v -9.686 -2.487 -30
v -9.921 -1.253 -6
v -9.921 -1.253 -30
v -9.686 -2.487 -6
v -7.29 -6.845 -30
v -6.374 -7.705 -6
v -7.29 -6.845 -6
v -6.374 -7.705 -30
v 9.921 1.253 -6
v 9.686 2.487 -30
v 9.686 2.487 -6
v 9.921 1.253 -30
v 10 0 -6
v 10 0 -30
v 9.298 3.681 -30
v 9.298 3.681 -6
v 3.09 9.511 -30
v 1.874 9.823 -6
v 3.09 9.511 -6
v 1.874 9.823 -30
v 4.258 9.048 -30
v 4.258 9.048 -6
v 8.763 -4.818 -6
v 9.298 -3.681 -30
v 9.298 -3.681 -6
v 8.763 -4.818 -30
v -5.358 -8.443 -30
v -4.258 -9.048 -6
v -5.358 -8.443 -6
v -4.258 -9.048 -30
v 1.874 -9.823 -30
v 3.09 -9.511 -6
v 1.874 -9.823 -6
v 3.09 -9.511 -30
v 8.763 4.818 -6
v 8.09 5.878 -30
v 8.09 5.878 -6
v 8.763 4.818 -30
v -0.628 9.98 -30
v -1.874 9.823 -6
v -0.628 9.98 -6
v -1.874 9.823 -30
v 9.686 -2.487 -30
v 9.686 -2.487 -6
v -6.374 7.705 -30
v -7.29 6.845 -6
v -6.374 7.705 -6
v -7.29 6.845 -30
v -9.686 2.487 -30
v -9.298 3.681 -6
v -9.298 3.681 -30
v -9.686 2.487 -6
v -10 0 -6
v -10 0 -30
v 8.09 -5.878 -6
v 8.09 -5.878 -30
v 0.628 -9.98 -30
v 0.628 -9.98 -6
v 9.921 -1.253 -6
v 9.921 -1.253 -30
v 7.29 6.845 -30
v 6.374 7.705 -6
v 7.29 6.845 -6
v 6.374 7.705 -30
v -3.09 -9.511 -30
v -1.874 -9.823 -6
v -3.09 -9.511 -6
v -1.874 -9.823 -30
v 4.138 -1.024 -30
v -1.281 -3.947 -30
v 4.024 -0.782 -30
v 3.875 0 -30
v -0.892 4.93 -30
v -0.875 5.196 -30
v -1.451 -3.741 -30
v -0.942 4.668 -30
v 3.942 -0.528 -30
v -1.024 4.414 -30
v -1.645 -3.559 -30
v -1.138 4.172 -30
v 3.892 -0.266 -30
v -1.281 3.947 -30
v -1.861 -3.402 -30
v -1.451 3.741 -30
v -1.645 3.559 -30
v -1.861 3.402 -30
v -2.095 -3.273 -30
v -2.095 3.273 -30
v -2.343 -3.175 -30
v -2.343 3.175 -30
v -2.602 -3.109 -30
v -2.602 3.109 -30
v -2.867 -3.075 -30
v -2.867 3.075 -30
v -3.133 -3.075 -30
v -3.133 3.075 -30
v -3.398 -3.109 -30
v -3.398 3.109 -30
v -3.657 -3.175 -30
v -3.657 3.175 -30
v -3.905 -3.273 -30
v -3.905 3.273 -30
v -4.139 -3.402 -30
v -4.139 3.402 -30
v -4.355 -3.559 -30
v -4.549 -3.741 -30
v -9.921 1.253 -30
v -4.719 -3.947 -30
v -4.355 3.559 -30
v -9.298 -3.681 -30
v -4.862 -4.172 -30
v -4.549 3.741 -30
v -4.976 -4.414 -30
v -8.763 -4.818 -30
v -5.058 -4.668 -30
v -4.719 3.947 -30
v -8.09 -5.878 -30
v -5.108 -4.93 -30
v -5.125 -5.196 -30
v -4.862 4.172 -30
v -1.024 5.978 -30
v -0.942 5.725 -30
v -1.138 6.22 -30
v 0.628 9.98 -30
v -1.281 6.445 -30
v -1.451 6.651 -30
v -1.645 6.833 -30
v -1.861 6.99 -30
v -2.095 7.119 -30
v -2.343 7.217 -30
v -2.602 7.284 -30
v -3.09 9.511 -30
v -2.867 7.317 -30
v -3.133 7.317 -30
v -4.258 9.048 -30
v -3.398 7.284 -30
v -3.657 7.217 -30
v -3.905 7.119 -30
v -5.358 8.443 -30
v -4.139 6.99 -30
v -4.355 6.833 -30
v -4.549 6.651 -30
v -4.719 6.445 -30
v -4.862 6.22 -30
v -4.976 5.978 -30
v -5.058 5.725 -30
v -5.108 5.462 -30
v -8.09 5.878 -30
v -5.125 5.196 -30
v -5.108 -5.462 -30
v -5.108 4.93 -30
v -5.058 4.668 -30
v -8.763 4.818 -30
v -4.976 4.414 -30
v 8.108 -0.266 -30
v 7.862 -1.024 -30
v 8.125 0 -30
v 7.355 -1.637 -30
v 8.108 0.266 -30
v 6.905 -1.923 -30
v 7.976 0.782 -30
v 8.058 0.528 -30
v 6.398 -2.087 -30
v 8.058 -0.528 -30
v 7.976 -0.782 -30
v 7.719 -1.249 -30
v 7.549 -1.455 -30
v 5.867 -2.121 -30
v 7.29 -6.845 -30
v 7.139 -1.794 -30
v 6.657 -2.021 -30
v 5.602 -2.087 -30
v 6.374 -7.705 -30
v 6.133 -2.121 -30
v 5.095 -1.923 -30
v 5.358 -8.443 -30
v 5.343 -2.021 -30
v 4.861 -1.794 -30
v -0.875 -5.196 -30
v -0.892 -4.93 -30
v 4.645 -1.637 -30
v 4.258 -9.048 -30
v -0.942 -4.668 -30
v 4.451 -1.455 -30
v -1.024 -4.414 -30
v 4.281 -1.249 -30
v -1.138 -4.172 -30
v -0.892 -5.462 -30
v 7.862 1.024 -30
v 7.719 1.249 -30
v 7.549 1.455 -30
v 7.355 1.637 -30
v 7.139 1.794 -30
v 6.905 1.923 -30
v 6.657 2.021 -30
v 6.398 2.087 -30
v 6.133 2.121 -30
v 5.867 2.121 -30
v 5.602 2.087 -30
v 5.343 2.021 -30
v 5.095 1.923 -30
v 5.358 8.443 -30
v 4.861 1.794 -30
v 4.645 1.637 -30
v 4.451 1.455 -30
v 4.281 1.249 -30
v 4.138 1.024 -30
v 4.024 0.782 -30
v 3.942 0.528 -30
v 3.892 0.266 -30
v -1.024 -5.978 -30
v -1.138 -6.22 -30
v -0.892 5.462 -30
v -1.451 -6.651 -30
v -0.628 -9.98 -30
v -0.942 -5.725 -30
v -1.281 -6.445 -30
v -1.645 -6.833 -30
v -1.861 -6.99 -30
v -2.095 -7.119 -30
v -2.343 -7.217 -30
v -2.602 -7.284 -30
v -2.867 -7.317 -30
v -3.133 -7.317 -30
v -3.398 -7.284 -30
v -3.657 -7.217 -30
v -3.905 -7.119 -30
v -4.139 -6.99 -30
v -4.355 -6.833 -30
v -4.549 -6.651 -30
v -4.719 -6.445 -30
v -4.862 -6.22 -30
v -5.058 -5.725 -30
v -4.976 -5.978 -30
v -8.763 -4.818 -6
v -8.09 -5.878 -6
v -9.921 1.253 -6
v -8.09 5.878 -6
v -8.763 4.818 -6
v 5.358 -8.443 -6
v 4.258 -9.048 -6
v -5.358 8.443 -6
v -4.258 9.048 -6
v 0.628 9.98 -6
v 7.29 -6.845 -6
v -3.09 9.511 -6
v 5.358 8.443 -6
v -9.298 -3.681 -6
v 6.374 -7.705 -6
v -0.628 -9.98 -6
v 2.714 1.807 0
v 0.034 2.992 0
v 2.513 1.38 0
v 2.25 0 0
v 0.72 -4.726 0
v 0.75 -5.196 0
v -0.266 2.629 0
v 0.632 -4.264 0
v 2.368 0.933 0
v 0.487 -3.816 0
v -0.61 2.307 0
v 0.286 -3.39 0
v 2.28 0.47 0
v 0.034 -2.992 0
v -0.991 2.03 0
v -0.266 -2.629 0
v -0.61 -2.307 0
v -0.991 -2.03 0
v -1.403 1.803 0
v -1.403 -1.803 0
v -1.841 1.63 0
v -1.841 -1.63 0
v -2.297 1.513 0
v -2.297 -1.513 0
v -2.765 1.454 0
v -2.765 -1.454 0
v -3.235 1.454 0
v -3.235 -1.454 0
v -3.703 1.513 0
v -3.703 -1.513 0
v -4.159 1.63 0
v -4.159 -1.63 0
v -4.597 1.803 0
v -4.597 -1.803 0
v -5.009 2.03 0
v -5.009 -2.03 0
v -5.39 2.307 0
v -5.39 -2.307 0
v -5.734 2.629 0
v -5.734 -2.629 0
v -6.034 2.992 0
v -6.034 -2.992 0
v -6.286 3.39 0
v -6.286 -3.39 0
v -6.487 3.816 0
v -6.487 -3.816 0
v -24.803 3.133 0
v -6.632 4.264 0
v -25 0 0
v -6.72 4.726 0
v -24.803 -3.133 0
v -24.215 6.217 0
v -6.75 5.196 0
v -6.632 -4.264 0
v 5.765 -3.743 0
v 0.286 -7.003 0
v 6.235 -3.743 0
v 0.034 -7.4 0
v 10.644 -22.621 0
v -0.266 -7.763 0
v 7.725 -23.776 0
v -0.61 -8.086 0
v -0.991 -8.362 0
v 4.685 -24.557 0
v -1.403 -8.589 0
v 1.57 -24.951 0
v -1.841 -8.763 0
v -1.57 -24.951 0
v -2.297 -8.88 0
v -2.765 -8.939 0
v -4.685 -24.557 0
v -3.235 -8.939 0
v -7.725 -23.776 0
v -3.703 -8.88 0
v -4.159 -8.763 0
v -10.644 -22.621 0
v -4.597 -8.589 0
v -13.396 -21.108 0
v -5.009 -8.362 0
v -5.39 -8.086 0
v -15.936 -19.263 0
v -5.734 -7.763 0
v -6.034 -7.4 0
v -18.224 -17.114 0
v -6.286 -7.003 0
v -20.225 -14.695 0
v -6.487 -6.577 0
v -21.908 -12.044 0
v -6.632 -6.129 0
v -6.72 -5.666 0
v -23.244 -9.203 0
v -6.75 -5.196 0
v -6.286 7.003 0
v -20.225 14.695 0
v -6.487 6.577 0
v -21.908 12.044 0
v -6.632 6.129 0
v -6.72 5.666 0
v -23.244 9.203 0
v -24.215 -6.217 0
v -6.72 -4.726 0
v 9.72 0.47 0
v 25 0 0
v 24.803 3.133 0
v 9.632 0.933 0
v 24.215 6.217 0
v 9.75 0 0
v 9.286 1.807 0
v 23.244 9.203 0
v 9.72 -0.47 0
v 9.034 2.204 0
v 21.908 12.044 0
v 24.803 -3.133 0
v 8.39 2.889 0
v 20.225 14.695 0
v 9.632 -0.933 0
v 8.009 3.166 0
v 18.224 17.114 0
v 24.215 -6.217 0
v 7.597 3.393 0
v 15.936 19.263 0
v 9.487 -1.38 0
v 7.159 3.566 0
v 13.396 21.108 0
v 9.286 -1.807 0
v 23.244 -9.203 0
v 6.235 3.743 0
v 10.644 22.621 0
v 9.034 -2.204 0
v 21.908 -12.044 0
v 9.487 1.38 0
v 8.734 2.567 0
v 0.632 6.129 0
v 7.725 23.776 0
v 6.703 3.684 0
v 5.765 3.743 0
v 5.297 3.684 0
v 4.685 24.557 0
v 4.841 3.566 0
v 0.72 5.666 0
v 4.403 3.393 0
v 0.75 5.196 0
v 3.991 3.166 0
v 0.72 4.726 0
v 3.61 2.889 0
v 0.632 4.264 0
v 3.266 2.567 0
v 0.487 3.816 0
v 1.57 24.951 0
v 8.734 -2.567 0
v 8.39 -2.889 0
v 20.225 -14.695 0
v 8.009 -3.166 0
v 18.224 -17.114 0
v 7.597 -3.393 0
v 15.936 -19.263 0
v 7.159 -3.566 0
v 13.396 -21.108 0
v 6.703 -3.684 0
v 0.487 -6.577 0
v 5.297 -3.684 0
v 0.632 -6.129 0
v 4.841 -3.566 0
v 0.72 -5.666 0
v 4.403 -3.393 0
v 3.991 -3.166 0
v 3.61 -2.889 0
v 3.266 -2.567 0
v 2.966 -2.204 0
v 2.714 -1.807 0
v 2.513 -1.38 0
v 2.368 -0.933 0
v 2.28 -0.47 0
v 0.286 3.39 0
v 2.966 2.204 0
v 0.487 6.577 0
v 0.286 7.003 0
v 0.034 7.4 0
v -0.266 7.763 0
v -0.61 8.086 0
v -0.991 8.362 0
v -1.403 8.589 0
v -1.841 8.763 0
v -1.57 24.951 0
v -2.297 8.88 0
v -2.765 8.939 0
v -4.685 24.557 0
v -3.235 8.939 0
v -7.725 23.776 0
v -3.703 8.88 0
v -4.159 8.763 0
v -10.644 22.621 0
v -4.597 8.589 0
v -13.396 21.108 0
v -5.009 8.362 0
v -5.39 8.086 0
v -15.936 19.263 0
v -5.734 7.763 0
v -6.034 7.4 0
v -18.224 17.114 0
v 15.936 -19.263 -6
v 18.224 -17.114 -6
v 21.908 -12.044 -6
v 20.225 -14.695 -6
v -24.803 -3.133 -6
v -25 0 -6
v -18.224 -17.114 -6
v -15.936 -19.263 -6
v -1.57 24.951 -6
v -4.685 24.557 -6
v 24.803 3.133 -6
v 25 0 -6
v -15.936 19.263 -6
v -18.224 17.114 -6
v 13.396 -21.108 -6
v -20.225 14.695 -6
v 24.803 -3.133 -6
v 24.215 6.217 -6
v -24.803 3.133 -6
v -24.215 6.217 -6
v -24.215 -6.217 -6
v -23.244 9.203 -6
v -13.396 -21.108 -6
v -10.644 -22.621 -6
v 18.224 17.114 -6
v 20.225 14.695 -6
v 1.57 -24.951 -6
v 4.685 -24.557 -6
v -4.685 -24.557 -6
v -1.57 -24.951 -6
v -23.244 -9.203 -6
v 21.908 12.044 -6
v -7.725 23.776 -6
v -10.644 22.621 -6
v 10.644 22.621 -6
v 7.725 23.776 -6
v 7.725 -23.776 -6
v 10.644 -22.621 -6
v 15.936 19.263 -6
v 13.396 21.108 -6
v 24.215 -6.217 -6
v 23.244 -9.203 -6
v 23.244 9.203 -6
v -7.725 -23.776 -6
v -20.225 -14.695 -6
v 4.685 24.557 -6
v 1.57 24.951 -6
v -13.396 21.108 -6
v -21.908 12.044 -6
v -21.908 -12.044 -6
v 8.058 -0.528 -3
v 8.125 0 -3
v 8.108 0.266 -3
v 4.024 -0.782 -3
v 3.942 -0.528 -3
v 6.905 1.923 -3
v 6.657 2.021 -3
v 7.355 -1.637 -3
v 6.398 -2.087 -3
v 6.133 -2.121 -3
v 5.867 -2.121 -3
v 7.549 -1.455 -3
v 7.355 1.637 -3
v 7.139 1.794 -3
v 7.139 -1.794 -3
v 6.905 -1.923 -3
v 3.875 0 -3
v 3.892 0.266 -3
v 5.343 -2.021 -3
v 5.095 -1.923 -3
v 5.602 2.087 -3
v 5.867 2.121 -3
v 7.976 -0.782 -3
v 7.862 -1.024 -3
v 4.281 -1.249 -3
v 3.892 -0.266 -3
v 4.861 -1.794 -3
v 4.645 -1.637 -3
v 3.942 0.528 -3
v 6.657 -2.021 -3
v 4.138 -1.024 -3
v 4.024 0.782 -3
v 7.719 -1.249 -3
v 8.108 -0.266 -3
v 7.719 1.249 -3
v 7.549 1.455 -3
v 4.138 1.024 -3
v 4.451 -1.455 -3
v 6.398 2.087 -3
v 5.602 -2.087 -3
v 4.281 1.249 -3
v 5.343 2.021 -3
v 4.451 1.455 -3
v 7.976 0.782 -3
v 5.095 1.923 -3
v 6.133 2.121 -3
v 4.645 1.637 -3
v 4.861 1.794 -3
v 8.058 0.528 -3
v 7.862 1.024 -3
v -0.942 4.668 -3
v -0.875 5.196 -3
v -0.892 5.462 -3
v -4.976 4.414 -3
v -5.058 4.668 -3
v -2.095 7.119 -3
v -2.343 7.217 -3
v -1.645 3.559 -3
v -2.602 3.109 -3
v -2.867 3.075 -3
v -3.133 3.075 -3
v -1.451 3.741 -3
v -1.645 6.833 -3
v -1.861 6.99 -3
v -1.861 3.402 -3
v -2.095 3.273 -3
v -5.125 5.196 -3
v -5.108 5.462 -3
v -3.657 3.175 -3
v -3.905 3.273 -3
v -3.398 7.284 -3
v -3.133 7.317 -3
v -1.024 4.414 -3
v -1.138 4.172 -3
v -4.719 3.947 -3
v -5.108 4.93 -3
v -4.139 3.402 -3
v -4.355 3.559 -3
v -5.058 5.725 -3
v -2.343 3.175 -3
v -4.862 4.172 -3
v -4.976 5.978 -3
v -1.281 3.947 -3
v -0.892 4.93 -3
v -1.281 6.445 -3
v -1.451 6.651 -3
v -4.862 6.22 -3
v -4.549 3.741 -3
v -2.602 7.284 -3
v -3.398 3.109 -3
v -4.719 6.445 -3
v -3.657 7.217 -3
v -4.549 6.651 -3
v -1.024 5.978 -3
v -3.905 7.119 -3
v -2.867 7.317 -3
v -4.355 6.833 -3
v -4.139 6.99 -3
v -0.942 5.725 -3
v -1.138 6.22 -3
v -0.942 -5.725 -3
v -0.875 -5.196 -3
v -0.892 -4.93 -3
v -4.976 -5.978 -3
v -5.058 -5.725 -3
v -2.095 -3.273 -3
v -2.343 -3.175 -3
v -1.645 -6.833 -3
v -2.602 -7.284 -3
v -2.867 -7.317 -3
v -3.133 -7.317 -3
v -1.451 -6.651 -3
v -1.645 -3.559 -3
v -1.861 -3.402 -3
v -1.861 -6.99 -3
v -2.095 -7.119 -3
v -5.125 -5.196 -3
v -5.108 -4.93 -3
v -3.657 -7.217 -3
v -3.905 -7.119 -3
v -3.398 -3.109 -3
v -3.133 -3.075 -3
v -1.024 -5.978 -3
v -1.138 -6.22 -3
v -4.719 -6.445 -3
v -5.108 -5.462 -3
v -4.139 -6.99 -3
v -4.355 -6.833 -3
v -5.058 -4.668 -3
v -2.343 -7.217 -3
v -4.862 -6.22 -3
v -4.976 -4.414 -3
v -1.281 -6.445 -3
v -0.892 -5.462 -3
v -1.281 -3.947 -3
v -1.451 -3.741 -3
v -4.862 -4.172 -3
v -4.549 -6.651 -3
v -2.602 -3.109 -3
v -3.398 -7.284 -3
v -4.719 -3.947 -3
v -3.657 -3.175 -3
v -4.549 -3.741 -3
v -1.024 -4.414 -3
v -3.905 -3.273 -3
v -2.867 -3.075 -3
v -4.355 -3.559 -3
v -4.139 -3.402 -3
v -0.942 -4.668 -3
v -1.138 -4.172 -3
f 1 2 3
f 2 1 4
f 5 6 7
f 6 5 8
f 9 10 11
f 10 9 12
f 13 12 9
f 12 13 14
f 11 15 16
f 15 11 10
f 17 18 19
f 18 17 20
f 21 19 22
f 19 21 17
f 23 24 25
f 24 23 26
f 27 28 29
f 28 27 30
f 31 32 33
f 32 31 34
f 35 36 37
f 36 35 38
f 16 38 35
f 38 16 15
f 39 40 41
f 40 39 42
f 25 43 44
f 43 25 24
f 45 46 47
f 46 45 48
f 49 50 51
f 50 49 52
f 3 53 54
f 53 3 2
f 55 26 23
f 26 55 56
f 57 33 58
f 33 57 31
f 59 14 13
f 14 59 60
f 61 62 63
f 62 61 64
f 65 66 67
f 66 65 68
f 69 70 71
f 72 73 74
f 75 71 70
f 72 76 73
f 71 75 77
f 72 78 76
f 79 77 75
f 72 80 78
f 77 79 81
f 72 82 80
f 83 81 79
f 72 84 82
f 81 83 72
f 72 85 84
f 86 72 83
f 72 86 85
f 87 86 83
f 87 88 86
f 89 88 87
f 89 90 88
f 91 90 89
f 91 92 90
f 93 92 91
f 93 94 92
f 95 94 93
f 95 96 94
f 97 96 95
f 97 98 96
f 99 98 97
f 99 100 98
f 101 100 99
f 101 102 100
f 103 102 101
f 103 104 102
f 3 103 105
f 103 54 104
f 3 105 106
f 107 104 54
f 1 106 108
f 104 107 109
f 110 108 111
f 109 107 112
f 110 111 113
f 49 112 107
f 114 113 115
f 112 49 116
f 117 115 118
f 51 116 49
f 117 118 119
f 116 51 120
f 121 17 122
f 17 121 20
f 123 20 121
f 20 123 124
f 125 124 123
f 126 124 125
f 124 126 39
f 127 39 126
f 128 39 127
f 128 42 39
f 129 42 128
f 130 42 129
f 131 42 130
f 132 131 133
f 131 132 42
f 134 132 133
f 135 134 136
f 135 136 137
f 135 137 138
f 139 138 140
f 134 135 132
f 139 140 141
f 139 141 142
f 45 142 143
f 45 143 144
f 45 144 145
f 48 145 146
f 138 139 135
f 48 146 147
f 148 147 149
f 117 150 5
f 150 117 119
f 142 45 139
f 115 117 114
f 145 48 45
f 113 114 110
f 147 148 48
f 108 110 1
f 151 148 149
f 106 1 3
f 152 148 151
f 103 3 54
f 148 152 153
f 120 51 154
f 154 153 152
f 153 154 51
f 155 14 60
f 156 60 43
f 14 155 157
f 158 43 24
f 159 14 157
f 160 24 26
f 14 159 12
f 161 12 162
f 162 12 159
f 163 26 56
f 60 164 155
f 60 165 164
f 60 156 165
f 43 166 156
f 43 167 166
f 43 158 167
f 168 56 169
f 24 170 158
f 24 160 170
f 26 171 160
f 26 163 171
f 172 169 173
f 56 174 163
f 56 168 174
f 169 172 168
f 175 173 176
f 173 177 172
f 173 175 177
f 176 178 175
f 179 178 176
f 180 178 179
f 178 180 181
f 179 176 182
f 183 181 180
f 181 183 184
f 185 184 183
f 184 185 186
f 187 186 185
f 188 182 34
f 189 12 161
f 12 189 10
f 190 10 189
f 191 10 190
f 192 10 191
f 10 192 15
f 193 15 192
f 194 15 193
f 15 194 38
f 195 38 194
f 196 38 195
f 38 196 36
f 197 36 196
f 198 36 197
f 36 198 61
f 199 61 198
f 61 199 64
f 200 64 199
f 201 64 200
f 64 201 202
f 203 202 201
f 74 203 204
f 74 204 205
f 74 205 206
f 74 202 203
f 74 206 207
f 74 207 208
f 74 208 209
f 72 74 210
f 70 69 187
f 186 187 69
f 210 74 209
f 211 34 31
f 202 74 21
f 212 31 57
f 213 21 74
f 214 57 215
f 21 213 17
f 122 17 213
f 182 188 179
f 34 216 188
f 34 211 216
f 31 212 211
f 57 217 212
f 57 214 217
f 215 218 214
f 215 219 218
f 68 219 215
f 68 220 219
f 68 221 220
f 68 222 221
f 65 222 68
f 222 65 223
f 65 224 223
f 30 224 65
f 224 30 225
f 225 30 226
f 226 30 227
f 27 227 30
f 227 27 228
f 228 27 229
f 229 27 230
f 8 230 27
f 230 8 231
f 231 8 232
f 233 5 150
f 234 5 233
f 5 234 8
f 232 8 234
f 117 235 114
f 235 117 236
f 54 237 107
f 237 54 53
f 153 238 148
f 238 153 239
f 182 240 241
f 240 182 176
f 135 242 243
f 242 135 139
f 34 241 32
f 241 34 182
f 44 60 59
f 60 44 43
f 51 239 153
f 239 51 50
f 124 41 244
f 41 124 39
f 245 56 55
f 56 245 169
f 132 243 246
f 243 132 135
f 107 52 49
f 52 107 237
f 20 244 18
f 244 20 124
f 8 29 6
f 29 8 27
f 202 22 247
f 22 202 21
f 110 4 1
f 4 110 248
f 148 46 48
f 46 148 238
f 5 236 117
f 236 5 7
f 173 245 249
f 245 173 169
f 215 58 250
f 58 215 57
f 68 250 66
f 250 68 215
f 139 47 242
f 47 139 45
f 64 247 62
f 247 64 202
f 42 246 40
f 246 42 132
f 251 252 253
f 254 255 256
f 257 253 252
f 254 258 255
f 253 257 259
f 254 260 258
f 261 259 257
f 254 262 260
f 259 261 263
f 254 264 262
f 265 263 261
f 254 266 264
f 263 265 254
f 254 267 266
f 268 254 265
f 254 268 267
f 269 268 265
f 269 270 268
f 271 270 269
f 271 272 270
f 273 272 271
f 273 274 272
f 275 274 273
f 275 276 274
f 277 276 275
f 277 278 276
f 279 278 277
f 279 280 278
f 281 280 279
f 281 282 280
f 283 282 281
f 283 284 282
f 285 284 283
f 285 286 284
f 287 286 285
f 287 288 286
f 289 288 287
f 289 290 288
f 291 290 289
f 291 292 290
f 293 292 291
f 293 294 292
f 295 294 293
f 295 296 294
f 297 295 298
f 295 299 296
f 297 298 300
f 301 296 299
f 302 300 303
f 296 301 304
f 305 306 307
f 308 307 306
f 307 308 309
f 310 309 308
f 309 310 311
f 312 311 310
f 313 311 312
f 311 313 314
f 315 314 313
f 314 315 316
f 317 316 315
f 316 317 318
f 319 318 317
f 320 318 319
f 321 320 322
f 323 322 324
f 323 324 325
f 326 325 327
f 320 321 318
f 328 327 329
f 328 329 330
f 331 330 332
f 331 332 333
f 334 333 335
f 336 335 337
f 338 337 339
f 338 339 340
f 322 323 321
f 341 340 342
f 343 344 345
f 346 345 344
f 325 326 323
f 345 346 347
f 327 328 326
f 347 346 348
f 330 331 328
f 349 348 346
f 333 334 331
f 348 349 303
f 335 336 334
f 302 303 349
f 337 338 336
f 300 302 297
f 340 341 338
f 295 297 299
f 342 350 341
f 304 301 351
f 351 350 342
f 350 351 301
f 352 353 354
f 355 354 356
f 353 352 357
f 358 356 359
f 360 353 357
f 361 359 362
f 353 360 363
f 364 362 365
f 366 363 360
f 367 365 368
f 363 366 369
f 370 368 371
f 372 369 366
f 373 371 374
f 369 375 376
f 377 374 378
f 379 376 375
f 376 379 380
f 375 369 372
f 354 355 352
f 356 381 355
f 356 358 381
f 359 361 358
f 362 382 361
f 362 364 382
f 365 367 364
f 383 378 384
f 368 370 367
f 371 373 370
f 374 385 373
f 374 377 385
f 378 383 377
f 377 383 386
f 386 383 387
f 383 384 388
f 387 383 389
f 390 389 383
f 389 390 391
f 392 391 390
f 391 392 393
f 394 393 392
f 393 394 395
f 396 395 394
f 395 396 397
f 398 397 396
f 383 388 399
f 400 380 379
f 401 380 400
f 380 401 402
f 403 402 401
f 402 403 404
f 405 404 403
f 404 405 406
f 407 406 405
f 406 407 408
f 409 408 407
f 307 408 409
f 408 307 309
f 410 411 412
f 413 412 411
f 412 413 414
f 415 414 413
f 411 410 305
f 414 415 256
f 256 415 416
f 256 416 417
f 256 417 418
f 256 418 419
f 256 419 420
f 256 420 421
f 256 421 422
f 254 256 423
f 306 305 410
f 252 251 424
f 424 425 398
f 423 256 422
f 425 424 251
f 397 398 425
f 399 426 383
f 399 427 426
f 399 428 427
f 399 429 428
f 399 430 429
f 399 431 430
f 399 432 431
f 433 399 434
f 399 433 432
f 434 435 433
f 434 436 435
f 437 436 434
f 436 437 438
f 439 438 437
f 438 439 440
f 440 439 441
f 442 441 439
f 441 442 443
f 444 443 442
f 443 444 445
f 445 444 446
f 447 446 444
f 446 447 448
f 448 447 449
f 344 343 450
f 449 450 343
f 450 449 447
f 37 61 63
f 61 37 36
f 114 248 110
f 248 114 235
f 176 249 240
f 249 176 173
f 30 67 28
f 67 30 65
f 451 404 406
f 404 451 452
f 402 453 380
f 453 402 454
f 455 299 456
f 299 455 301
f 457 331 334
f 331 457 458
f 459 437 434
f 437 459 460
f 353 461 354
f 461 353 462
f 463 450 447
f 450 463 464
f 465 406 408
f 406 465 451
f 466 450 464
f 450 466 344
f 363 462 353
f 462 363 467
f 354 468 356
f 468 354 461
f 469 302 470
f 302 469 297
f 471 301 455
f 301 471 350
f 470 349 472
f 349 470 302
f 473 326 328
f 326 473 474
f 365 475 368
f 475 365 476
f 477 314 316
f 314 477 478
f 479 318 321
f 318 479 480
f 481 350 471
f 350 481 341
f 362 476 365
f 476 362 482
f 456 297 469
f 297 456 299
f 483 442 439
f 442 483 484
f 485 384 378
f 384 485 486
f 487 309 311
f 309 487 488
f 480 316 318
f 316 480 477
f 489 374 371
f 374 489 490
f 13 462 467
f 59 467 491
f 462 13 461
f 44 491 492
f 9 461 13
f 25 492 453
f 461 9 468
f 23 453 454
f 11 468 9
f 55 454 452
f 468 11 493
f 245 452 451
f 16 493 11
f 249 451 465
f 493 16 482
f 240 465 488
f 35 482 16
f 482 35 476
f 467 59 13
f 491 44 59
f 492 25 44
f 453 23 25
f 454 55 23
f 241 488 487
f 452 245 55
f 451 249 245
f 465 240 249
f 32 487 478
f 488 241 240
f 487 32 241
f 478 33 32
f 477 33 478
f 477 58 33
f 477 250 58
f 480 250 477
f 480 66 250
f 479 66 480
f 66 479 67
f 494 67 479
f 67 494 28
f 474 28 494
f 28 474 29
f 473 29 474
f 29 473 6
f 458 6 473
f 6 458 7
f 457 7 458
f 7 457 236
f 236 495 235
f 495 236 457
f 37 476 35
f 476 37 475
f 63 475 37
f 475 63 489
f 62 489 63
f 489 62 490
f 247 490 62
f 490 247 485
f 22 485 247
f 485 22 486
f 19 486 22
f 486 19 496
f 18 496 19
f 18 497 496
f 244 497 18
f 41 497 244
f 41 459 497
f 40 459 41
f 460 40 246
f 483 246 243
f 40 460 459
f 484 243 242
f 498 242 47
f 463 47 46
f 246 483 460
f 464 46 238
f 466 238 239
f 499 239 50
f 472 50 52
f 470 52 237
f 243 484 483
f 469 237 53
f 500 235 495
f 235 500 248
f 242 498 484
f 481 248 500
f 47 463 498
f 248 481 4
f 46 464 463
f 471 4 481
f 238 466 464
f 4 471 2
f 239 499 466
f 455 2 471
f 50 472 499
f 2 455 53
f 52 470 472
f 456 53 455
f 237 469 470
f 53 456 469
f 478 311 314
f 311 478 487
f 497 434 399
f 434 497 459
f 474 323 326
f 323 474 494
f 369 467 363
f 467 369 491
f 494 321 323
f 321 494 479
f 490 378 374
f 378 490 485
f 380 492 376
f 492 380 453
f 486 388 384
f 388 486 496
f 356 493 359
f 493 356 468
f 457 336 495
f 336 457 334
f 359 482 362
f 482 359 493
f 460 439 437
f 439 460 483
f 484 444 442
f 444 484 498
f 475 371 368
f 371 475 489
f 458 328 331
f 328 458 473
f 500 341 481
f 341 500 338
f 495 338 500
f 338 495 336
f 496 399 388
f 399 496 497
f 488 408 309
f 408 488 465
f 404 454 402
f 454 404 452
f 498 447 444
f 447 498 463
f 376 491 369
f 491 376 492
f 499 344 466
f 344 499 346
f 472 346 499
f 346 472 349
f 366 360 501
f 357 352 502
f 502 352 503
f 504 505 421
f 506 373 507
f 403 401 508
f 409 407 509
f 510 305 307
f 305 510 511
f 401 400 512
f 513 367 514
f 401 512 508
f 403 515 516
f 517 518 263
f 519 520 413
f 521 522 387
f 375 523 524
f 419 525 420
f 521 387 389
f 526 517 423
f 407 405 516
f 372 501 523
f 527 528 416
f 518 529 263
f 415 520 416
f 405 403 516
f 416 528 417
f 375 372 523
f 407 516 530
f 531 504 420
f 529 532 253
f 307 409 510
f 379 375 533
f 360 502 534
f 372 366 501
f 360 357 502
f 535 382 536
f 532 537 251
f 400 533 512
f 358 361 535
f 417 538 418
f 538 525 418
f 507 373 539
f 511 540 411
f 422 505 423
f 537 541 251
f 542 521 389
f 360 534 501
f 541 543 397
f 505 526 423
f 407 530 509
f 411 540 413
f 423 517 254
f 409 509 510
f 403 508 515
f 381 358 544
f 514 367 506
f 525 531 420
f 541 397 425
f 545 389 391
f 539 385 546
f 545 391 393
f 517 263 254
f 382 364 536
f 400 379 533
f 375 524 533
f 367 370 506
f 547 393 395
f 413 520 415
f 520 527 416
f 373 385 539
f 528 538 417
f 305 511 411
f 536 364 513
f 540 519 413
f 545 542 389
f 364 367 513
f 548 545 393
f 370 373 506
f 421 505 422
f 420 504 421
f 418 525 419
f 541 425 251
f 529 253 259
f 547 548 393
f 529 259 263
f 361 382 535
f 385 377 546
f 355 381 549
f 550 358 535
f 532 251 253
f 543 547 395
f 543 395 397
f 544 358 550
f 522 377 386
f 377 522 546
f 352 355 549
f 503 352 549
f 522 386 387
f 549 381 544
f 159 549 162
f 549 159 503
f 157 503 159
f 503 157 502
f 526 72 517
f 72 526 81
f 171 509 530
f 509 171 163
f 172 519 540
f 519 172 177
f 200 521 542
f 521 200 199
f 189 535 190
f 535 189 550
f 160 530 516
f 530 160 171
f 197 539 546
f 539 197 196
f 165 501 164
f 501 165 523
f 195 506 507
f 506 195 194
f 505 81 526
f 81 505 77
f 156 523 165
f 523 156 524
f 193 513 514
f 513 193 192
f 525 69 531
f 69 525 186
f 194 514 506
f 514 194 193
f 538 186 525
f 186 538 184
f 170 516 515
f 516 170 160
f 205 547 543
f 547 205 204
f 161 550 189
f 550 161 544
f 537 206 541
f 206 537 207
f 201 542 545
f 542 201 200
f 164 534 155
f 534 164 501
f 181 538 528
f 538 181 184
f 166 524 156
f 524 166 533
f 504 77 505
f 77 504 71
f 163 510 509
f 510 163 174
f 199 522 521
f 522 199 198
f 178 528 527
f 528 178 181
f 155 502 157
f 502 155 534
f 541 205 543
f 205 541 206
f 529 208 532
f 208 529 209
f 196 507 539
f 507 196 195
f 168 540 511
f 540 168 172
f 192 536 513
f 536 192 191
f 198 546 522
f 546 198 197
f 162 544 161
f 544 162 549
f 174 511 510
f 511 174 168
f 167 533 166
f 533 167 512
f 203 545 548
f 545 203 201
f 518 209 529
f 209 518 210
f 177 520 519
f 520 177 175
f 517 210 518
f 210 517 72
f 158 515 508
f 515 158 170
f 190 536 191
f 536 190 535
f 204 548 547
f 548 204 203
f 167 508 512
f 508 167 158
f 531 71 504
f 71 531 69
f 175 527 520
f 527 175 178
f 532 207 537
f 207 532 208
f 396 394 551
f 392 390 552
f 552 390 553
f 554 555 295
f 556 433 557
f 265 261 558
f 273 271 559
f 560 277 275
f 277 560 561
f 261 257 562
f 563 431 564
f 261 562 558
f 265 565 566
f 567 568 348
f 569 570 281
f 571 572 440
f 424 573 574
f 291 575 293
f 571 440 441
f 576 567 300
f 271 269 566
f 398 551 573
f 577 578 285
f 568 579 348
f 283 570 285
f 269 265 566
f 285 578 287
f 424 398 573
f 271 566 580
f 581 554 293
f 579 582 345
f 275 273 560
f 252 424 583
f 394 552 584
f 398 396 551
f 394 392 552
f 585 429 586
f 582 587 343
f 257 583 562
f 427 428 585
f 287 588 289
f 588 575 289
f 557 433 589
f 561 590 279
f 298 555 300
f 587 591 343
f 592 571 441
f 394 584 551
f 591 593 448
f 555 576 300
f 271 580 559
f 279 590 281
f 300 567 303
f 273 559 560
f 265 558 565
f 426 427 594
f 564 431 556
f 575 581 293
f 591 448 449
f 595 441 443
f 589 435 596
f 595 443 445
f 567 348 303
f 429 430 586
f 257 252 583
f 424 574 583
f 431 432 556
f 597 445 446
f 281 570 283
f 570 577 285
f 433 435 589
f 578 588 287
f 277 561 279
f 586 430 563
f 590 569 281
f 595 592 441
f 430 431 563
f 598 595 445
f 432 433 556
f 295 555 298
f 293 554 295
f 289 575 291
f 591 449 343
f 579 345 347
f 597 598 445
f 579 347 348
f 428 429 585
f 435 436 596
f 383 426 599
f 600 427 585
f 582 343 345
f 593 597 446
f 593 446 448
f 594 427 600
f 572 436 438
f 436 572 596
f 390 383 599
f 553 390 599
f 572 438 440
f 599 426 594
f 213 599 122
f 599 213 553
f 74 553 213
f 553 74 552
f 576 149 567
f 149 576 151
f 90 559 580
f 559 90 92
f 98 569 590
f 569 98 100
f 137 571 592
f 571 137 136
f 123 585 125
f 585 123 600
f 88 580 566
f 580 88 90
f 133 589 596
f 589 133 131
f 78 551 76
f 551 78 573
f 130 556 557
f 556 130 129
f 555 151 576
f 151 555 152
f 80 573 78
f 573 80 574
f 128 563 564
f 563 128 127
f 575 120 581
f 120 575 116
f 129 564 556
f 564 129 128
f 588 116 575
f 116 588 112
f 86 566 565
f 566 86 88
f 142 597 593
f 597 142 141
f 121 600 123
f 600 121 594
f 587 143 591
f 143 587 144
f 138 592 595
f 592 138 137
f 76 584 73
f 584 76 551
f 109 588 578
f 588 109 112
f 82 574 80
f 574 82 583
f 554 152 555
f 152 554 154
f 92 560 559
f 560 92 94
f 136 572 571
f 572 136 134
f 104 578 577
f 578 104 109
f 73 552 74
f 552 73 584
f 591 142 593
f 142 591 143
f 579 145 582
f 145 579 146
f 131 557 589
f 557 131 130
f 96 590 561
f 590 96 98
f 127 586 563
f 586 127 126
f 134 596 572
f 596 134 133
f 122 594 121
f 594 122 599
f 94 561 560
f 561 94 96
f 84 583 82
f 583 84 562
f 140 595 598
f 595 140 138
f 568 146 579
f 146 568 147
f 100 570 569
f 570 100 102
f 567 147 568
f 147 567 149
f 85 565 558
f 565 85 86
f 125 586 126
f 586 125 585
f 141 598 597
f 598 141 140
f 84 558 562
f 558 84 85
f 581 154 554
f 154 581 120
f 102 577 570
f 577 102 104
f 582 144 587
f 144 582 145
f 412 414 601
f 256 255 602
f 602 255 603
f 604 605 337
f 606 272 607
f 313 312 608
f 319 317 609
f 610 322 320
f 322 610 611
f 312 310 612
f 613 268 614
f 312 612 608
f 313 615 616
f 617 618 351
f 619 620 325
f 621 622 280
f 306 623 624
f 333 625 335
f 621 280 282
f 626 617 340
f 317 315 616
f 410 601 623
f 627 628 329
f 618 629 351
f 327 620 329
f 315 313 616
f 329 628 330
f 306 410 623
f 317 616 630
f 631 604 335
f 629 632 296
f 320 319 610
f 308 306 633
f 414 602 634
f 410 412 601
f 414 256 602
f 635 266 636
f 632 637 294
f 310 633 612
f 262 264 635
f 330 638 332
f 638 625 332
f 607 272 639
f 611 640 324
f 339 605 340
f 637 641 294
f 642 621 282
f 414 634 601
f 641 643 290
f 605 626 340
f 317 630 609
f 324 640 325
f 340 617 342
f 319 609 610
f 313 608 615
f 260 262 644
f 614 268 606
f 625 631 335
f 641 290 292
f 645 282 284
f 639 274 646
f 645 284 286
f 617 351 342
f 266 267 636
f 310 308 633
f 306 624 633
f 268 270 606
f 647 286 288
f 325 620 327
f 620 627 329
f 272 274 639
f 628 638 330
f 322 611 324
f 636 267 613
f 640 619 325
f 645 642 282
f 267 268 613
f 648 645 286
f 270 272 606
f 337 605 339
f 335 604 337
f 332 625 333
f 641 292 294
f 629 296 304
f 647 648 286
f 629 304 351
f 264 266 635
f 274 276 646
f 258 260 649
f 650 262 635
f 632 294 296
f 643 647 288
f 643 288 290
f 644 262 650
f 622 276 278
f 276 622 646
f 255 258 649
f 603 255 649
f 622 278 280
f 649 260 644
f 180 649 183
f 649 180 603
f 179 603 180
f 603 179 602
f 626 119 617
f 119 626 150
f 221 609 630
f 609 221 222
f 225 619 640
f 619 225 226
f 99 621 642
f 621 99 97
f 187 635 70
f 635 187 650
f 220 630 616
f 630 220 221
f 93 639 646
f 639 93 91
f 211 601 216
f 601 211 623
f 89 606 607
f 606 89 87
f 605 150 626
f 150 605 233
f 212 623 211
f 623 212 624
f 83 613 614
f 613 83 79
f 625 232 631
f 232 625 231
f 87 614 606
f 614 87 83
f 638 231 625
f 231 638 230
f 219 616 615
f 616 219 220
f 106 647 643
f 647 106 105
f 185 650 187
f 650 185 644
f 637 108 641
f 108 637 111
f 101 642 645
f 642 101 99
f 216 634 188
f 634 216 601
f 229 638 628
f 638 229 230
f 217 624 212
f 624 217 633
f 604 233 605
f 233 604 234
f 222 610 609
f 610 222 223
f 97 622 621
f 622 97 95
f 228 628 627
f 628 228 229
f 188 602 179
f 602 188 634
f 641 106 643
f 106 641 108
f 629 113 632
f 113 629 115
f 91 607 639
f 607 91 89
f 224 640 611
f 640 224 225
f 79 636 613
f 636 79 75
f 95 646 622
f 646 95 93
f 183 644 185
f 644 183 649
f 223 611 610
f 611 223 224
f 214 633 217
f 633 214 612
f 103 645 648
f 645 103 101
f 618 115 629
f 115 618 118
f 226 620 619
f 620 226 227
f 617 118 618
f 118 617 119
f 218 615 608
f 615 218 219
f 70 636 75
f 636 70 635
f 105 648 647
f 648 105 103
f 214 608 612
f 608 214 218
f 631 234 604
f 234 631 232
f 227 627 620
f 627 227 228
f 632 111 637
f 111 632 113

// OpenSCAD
$fn = 50;


difference() {
	union() {
		translate(v = [0, 0, -30.0000000000]) {
			cylinder(h = 30, r = 10.0000000000);
		}
		translate(v = [0, 0, -6.0000000000]) {
			cylinder(h = 6, r = 25.0000000000);
		}
	}
	union() {
		translate(v = [6.0000000000, 0.0000000000, 0]) {
			rotate(a = [0, 0, 0]) {
				difference() {
					union() {
						#translate(v = [0, 0, -30.0000000000]) {
							cylinder(h = 30, r = 2.0000000000);
						}
						#translate(v = [0, 0, -3]) {
							cylinder(h = 3, r = 10.0000000000, r1 = 2.1250000000, r2 = 3.7500000000);
						}
						#translate(v = [0, 0, -30.0000000000]) {
							cylinder(h = 30, r = 2.1250000000);
						}
						#translate(v = [0, 0, -30.0000000000]) {
							cylinder(h = 30, r = 2.0000000000);
						}
					}
					union();
				}
			}
		}
		translate(v = [-3.0000000000, 5.1961524227, 0]) {
			rotate(a = [0, 0, 0]) {
				difference() {
					union() {
						#translate(v = [0, 0, -30.0000000000]) {
							cylinder(h = 30, r = 2.0000000000);
						}
						#translate(v = [0, 0, -3]) {
							cylinder(h = 3, r = 10.0000000000, r1 = 2.1250000000, r2 = 3.7500000000);
						}
						#translate(v = [0, 0, -30.0000000000]) {
							cylinder(h = 30, r = 2.1250000000);
						}
						#translate(v = [0, 0, -30.0000000000]) {
							cylinder(h = 30, r = 2.0000000000);
						}
					}
					union();
				}
			}
		}
		translate(v = [-3.0000000000, -5.1961524227, 0]) {
			rotate(a = [0, 0, 0]) {
				difference() {
					union() {
						#translate(v = [0, 0, -30.0000000000]) {
							cylinder(h = 30, r = 2.0000000000);
						}
						#translate(v = [0, 0, -3]) {
							cylinder(h = 3, r = 10.0000000000, r1 = 2.1250000000, r2 = 3.7500000000);
						}
						#translate(v = [0, 0, -30.0000000000]) {
							cylinder(h = 30, r = 2.1250000000);
						}
						#translate(v = [0, 0, -30.0000000000]) {
							cylinder(h = 30, r = 2.0000000000);
						}
					}
					union();
				}
			}
		}
	}
}
